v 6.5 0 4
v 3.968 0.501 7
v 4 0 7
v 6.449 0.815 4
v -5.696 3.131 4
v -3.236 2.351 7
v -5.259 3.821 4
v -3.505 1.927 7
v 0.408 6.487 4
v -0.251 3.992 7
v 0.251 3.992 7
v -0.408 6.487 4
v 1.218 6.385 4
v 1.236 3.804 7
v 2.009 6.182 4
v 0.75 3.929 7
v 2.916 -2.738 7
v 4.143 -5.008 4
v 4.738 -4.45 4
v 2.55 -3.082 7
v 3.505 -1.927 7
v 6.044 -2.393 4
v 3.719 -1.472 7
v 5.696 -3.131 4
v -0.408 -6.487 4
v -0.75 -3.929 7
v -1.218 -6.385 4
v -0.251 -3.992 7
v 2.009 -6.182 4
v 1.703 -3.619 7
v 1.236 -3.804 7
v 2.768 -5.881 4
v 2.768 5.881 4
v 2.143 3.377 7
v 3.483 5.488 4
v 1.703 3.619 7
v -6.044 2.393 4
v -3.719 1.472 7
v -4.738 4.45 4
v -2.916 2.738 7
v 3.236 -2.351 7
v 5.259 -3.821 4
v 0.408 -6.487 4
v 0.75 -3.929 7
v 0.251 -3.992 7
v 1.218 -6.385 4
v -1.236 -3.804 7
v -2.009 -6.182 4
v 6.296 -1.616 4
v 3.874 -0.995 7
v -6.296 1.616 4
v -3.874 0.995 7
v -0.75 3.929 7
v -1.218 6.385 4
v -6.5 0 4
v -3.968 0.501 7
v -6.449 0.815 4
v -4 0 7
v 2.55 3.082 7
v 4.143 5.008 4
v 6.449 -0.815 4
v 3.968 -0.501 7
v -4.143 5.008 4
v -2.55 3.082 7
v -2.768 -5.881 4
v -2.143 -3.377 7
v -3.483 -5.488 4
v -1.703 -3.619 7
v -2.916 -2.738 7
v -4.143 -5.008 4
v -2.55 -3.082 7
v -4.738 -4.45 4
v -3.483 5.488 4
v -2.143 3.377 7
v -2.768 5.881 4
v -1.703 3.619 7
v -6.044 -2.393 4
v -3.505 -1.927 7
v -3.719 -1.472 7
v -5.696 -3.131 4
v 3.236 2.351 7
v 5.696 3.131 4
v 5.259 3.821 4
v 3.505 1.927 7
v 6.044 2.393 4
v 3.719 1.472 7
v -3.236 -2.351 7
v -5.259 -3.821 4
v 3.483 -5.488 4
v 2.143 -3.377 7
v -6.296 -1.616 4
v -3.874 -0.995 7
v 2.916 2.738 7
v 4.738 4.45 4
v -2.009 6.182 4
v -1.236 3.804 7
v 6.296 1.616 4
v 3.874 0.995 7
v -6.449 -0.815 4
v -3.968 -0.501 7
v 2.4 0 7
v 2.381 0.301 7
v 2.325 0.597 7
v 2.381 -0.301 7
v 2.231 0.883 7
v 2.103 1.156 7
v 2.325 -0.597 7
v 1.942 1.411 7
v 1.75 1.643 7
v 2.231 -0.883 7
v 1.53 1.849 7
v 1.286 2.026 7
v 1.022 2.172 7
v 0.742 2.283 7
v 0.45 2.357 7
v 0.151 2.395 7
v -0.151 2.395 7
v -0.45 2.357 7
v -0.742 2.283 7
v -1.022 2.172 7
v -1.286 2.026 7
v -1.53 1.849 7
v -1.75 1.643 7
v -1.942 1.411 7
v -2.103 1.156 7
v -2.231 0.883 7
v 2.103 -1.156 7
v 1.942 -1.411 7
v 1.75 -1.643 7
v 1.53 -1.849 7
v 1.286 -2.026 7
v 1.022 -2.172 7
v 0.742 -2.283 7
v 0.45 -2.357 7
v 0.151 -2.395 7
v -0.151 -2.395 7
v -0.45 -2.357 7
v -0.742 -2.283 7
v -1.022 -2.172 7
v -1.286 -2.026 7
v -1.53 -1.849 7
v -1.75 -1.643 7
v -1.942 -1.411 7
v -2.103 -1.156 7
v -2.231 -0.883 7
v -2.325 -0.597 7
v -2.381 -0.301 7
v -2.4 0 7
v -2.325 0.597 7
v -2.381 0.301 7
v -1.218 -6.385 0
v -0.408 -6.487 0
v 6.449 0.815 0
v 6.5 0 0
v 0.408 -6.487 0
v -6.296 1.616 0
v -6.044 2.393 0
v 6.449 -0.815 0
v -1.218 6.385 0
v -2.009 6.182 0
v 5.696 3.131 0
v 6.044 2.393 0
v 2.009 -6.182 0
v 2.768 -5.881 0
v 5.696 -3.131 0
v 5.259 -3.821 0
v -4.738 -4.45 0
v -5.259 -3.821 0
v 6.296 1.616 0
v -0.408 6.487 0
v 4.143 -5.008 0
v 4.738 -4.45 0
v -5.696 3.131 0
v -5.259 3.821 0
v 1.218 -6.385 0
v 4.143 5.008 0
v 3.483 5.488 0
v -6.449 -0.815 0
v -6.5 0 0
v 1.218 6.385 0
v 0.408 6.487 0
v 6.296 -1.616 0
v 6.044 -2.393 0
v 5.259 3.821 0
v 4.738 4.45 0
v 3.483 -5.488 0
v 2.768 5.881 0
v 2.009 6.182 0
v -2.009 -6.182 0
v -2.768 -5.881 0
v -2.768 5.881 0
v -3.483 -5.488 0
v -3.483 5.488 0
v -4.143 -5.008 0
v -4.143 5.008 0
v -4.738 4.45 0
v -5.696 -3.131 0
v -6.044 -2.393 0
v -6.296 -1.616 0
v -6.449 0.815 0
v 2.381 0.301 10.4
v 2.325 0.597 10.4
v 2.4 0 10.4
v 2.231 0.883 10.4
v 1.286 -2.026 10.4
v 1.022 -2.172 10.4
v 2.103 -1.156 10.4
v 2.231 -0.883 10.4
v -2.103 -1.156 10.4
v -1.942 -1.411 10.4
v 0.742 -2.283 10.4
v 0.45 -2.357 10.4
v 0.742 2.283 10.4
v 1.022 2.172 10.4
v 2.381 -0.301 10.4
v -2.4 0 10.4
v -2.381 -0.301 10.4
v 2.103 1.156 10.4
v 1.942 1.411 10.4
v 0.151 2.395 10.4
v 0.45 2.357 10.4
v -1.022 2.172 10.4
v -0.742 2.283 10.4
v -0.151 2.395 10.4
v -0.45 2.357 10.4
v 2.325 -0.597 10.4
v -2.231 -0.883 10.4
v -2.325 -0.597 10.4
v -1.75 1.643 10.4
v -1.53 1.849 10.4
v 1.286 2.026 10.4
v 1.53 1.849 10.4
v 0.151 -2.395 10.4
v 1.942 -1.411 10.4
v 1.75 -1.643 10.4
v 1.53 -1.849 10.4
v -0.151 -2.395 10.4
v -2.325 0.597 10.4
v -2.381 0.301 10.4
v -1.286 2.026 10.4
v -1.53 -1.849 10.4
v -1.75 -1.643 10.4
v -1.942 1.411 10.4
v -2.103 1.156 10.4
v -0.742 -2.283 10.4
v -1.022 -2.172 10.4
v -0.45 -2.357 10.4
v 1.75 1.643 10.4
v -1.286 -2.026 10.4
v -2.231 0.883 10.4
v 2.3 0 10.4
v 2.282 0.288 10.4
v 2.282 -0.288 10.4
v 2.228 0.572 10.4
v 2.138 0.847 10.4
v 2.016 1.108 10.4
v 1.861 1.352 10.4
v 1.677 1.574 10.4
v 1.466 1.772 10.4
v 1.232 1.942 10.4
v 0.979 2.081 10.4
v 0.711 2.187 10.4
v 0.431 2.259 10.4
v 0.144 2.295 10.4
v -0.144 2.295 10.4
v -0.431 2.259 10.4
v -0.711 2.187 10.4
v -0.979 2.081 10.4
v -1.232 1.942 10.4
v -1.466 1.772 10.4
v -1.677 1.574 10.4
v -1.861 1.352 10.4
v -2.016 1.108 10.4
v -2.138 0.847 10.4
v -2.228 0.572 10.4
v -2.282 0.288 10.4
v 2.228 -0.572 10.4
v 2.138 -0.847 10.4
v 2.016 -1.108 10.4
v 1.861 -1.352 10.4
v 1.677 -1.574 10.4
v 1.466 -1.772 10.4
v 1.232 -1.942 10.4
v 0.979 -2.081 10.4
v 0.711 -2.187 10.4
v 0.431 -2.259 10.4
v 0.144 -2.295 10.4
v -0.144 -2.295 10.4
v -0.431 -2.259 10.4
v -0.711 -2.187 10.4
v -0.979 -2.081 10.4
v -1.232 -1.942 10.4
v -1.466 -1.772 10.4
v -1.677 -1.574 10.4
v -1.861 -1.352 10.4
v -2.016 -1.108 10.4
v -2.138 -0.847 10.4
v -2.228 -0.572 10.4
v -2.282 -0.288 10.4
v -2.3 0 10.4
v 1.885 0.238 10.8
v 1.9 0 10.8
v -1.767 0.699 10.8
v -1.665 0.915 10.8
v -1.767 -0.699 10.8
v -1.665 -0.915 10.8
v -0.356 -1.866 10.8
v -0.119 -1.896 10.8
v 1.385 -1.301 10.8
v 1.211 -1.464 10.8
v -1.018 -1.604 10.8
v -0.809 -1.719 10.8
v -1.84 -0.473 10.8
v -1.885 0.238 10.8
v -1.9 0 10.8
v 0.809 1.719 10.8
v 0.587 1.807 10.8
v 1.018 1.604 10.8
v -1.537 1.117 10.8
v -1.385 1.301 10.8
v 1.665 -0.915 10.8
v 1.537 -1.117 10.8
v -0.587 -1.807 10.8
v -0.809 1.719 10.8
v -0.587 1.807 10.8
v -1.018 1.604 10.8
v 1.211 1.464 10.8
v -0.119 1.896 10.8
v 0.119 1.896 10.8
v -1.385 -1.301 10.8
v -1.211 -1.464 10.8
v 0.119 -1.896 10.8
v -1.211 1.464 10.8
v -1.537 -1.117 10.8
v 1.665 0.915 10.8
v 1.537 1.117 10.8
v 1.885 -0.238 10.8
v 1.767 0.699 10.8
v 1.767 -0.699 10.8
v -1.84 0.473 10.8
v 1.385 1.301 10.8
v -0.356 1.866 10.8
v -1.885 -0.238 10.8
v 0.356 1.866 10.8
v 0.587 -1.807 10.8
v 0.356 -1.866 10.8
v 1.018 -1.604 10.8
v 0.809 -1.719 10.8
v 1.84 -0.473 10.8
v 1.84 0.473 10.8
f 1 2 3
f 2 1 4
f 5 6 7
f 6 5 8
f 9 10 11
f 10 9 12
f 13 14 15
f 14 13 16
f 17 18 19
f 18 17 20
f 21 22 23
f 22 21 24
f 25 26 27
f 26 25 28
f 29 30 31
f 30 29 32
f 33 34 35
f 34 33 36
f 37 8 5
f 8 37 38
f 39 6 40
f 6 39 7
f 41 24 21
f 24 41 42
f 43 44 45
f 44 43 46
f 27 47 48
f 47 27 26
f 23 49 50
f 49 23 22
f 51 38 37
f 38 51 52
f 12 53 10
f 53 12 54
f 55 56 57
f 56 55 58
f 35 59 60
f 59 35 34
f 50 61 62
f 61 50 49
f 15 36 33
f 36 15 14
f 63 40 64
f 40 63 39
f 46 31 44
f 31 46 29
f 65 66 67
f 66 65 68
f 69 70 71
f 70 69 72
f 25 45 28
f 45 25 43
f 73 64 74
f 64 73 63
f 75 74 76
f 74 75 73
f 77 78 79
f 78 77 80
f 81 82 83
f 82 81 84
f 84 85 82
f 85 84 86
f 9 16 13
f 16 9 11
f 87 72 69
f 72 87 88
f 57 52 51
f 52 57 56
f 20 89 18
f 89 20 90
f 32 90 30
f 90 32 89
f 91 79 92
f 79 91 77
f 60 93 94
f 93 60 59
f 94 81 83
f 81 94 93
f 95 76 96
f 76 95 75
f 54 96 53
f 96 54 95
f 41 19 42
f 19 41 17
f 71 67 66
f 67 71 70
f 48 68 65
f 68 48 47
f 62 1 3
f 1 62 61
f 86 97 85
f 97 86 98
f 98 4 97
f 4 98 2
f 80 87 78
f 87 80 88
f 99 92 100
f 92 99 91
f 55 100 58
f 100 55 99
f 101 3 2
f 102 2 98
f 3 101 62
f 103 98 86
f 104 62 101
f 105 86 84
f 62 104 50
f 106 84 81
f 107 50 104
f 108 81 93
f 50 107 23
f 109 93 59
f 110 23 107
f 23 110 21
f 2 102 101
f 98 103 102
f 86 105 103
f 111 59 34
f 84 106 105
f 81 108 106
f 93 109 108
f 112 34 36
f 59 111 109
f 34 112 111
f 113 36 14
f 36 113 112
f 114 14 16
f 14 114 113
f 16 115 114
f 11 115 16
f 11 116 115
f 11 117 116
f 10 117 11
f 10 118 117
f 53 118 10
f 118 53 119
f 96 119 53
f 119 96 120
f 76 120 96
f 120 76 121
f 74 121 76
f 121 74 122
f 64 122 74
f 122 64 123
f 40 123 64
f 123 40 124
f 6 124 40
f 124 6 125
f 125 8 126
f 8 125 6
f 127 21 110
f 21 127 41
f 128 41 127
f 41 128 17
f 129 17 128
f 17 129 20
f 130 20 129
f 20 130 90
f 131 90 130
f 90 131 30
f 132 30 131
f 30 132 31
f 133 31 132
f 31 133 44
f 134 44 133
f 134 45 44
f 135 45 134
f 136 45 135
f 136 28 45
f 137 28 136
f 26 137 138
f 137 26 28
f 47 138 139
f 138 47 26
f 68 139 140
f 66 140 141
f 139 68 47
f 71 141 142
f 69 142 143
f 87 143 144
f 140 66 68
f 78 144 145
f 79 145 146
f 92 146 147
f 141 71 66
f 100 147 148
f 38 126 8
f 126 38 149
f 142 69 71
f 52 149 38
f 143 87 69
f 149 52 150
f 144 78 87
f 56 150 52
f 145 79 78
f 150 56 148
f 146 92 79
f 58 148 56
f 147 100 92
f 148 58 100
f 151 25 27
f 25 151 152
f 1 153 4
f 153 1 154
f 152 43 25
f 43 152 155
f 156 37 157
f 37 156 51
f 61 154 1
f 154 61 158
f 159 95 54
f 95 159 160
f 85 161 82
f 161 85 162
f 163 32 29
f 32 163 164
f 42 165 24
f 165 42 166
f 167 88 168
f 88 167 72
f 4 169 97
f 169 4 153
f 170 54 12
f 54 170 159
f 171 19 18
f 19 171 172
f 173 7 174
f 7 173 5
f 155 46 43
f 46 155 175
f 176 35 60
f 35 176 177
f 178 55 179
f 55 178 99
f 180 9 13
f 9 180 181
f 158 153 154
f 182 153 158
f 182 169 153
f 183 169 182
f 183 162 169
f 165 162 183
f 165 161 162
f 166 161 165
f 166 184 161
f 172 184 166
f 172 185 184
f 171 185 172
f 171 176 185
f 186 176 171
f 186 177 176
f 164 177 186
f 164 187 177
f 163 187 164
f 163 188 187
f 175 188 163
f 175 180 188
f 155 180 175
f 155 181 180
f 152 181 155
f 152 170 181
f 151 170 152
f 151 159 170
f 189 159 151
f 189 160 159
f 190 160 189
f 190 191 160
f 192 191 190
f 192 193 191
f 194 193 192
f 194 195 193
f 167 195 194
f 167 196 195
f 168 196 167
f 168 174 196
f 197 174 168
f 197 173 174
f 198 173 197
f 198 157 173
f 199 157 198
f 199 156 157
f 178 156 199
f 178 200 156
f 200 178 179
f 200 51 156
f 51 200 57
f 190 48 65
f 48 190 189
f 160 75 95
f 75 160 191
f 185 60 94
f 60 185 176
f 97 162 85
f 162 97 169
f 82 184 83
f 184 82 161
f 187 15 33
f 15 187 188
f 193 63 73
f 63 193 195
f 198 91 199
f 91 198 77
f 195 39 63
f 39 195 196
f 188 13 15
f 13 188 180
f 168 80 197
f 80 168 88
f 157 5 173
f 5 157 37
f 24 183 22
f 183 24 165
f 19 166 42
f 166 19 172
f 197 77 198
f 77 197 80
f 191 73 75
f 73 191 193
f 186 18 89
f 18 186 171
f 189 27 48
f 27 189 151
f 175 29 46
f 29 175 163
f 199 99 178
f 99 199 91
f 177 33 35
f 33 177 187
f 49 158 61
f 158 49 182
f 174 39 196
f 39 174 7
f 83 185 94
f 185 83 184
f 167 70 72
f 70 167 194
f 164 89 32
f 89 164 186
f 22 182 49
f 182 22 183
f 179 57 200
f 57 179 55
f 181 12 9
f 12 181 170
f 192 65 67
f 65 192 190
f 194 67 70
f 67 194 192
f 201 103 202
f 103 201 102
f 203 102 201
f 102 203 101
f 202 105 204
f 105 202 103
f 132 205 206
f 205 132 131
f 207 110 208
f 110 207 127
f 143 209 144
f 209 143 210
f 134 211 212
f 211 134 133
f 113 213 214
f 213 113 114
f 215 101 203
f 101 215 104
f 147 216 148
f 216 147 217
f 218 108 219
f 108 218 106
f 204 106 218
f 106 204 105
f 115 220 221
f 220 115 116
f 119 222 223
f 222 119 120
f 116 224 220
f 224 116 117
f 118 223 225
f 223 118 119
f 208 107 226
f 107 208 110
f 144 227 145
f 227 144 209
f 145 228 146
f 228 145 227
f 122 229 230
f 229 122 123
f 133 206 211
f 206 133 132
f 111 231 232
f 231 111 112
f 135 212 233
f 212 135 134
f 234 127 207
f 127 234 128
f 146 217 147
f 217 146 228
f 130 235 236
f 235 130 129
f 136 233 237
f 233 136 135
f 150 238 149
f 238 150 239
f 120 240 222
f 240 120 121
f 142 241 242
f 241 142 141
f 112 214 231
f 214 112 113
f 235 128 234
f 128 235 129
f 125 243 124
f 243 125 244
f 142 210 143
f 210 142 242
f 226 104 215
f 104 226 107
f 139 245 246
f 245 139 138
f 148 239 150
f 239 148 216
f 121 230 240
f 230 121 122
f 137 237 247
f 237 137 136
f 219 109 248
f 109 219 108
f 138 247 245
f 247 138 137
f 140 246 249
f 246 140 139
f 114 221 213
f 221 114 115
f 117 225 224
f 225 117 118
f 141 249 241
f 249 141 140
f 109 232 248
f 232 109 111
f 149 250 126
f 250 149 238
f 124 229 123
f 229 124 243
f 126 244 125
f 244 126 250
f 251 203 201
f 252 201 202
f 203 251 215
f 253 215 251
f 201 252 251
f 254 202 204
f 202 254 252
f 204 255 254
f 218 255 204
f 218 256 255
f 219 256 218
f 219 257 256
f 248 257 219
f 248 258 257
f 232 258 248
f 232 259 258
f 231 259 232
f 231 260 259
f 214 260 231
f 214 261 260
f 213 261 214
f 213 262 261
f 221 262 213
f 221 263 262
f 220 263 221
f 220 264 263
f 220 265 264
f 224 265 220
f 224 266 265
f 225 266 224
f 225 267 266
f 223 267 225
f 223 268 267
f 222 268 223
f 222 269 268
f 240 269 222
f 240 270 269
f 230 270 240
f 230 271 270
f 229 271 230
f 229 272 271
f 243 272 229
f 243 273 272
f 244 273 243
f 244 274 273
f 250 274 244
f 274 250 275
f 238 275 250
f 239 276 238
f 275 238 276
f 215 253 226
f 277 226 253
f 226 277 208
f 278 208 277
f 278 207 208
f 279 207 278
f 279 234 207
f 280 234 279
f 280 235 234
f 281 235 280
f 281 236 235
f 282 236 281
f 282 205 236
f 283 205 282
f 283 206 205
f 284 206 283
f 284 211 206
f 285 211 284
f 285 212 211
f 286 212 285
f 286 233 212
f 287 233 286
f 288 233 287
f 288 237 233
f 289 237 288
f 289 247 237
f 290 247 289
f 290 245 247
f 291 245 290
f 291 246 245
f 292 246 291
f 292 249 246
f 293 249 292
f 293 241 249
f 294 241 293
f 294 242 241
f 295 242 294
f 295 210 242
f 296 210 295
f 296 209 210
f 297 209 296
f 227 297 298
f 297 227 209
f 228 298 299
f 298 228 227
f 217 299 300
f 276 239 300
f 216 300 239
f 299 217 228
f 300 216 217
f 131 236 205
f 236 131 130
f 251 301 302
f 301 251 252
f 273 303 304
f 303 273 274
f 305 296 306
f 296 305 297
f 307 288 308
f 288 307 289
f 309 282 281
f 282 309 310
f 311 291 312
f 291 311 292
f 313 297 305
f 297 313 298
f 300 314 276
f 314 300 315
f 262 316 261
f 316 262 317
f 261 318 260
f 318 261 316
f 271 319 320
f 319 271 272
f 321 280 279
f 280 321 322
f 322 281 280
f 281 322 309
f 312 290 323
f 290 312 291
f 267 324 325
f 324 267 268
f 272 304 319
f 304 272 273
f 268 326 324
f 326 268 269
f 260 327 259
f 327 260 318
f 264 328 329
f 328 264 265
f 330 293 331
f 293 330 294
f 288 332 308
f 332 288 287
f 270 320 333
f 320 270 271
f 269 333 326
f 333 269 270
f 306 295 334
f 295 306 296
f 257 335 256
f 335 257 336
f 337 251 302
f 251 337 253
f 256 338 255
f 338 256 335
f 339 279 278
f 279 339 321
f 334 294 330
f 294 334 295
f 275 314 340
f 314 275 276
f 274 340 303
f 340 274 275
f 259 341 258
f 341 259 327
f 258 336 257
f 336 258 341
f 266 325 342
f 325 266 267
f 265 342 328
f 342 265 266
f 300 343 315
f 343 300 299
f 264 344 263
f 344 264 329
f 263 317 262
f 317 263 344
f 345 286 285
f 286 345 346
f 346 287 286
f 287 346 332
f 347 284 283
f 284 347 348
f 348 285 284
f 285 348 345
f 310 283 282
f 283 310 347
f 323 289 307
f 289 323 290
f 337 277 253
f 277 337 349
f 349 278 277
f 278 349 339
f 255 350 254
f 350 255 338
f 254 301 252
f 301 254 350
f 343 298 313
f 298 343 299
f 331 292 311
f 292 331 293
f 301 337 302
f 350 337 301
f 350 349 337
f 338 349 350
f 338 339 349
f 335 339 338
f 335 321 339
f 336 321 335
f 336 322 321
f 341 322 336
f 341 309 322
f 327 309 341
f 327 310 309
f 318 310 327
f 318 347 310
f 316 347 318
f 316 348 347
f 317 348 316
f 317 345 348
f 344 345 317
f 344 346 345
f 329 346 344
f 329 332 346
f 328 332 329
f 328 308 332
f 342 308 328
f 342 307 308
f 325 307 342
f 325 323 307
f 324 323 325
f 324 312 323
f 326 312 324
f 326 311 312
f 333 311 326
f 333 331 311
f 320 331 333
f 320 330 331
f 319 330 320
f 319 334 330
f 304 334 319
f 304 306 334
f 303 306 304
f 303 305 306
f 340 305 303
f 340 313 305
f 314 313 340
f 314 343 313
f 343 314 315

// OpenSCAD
union() {
  union() {
    union() {
      cylinder(h = 4, r = 6.5);
      translate([0, 0, 4]) {
        intersection() {
          cylinder(h = 7.8, r1 = 6.5, r2 = 0);
          cylinder(h = 3, r = 6.5);
        }
      }
    }
    translate([0, 0, 6.8]) {
      cylinder(h = 3.6, r = 2.4);
    }
  }
  translate([0, 0, 10.3]) {
    intersection() {
      cylinder(h = 2.4, r1 = 2.4, r2 = 0);
      cylinder(h = 0.5, r = 2.4);
    }
  }
}
$fn = 50;
